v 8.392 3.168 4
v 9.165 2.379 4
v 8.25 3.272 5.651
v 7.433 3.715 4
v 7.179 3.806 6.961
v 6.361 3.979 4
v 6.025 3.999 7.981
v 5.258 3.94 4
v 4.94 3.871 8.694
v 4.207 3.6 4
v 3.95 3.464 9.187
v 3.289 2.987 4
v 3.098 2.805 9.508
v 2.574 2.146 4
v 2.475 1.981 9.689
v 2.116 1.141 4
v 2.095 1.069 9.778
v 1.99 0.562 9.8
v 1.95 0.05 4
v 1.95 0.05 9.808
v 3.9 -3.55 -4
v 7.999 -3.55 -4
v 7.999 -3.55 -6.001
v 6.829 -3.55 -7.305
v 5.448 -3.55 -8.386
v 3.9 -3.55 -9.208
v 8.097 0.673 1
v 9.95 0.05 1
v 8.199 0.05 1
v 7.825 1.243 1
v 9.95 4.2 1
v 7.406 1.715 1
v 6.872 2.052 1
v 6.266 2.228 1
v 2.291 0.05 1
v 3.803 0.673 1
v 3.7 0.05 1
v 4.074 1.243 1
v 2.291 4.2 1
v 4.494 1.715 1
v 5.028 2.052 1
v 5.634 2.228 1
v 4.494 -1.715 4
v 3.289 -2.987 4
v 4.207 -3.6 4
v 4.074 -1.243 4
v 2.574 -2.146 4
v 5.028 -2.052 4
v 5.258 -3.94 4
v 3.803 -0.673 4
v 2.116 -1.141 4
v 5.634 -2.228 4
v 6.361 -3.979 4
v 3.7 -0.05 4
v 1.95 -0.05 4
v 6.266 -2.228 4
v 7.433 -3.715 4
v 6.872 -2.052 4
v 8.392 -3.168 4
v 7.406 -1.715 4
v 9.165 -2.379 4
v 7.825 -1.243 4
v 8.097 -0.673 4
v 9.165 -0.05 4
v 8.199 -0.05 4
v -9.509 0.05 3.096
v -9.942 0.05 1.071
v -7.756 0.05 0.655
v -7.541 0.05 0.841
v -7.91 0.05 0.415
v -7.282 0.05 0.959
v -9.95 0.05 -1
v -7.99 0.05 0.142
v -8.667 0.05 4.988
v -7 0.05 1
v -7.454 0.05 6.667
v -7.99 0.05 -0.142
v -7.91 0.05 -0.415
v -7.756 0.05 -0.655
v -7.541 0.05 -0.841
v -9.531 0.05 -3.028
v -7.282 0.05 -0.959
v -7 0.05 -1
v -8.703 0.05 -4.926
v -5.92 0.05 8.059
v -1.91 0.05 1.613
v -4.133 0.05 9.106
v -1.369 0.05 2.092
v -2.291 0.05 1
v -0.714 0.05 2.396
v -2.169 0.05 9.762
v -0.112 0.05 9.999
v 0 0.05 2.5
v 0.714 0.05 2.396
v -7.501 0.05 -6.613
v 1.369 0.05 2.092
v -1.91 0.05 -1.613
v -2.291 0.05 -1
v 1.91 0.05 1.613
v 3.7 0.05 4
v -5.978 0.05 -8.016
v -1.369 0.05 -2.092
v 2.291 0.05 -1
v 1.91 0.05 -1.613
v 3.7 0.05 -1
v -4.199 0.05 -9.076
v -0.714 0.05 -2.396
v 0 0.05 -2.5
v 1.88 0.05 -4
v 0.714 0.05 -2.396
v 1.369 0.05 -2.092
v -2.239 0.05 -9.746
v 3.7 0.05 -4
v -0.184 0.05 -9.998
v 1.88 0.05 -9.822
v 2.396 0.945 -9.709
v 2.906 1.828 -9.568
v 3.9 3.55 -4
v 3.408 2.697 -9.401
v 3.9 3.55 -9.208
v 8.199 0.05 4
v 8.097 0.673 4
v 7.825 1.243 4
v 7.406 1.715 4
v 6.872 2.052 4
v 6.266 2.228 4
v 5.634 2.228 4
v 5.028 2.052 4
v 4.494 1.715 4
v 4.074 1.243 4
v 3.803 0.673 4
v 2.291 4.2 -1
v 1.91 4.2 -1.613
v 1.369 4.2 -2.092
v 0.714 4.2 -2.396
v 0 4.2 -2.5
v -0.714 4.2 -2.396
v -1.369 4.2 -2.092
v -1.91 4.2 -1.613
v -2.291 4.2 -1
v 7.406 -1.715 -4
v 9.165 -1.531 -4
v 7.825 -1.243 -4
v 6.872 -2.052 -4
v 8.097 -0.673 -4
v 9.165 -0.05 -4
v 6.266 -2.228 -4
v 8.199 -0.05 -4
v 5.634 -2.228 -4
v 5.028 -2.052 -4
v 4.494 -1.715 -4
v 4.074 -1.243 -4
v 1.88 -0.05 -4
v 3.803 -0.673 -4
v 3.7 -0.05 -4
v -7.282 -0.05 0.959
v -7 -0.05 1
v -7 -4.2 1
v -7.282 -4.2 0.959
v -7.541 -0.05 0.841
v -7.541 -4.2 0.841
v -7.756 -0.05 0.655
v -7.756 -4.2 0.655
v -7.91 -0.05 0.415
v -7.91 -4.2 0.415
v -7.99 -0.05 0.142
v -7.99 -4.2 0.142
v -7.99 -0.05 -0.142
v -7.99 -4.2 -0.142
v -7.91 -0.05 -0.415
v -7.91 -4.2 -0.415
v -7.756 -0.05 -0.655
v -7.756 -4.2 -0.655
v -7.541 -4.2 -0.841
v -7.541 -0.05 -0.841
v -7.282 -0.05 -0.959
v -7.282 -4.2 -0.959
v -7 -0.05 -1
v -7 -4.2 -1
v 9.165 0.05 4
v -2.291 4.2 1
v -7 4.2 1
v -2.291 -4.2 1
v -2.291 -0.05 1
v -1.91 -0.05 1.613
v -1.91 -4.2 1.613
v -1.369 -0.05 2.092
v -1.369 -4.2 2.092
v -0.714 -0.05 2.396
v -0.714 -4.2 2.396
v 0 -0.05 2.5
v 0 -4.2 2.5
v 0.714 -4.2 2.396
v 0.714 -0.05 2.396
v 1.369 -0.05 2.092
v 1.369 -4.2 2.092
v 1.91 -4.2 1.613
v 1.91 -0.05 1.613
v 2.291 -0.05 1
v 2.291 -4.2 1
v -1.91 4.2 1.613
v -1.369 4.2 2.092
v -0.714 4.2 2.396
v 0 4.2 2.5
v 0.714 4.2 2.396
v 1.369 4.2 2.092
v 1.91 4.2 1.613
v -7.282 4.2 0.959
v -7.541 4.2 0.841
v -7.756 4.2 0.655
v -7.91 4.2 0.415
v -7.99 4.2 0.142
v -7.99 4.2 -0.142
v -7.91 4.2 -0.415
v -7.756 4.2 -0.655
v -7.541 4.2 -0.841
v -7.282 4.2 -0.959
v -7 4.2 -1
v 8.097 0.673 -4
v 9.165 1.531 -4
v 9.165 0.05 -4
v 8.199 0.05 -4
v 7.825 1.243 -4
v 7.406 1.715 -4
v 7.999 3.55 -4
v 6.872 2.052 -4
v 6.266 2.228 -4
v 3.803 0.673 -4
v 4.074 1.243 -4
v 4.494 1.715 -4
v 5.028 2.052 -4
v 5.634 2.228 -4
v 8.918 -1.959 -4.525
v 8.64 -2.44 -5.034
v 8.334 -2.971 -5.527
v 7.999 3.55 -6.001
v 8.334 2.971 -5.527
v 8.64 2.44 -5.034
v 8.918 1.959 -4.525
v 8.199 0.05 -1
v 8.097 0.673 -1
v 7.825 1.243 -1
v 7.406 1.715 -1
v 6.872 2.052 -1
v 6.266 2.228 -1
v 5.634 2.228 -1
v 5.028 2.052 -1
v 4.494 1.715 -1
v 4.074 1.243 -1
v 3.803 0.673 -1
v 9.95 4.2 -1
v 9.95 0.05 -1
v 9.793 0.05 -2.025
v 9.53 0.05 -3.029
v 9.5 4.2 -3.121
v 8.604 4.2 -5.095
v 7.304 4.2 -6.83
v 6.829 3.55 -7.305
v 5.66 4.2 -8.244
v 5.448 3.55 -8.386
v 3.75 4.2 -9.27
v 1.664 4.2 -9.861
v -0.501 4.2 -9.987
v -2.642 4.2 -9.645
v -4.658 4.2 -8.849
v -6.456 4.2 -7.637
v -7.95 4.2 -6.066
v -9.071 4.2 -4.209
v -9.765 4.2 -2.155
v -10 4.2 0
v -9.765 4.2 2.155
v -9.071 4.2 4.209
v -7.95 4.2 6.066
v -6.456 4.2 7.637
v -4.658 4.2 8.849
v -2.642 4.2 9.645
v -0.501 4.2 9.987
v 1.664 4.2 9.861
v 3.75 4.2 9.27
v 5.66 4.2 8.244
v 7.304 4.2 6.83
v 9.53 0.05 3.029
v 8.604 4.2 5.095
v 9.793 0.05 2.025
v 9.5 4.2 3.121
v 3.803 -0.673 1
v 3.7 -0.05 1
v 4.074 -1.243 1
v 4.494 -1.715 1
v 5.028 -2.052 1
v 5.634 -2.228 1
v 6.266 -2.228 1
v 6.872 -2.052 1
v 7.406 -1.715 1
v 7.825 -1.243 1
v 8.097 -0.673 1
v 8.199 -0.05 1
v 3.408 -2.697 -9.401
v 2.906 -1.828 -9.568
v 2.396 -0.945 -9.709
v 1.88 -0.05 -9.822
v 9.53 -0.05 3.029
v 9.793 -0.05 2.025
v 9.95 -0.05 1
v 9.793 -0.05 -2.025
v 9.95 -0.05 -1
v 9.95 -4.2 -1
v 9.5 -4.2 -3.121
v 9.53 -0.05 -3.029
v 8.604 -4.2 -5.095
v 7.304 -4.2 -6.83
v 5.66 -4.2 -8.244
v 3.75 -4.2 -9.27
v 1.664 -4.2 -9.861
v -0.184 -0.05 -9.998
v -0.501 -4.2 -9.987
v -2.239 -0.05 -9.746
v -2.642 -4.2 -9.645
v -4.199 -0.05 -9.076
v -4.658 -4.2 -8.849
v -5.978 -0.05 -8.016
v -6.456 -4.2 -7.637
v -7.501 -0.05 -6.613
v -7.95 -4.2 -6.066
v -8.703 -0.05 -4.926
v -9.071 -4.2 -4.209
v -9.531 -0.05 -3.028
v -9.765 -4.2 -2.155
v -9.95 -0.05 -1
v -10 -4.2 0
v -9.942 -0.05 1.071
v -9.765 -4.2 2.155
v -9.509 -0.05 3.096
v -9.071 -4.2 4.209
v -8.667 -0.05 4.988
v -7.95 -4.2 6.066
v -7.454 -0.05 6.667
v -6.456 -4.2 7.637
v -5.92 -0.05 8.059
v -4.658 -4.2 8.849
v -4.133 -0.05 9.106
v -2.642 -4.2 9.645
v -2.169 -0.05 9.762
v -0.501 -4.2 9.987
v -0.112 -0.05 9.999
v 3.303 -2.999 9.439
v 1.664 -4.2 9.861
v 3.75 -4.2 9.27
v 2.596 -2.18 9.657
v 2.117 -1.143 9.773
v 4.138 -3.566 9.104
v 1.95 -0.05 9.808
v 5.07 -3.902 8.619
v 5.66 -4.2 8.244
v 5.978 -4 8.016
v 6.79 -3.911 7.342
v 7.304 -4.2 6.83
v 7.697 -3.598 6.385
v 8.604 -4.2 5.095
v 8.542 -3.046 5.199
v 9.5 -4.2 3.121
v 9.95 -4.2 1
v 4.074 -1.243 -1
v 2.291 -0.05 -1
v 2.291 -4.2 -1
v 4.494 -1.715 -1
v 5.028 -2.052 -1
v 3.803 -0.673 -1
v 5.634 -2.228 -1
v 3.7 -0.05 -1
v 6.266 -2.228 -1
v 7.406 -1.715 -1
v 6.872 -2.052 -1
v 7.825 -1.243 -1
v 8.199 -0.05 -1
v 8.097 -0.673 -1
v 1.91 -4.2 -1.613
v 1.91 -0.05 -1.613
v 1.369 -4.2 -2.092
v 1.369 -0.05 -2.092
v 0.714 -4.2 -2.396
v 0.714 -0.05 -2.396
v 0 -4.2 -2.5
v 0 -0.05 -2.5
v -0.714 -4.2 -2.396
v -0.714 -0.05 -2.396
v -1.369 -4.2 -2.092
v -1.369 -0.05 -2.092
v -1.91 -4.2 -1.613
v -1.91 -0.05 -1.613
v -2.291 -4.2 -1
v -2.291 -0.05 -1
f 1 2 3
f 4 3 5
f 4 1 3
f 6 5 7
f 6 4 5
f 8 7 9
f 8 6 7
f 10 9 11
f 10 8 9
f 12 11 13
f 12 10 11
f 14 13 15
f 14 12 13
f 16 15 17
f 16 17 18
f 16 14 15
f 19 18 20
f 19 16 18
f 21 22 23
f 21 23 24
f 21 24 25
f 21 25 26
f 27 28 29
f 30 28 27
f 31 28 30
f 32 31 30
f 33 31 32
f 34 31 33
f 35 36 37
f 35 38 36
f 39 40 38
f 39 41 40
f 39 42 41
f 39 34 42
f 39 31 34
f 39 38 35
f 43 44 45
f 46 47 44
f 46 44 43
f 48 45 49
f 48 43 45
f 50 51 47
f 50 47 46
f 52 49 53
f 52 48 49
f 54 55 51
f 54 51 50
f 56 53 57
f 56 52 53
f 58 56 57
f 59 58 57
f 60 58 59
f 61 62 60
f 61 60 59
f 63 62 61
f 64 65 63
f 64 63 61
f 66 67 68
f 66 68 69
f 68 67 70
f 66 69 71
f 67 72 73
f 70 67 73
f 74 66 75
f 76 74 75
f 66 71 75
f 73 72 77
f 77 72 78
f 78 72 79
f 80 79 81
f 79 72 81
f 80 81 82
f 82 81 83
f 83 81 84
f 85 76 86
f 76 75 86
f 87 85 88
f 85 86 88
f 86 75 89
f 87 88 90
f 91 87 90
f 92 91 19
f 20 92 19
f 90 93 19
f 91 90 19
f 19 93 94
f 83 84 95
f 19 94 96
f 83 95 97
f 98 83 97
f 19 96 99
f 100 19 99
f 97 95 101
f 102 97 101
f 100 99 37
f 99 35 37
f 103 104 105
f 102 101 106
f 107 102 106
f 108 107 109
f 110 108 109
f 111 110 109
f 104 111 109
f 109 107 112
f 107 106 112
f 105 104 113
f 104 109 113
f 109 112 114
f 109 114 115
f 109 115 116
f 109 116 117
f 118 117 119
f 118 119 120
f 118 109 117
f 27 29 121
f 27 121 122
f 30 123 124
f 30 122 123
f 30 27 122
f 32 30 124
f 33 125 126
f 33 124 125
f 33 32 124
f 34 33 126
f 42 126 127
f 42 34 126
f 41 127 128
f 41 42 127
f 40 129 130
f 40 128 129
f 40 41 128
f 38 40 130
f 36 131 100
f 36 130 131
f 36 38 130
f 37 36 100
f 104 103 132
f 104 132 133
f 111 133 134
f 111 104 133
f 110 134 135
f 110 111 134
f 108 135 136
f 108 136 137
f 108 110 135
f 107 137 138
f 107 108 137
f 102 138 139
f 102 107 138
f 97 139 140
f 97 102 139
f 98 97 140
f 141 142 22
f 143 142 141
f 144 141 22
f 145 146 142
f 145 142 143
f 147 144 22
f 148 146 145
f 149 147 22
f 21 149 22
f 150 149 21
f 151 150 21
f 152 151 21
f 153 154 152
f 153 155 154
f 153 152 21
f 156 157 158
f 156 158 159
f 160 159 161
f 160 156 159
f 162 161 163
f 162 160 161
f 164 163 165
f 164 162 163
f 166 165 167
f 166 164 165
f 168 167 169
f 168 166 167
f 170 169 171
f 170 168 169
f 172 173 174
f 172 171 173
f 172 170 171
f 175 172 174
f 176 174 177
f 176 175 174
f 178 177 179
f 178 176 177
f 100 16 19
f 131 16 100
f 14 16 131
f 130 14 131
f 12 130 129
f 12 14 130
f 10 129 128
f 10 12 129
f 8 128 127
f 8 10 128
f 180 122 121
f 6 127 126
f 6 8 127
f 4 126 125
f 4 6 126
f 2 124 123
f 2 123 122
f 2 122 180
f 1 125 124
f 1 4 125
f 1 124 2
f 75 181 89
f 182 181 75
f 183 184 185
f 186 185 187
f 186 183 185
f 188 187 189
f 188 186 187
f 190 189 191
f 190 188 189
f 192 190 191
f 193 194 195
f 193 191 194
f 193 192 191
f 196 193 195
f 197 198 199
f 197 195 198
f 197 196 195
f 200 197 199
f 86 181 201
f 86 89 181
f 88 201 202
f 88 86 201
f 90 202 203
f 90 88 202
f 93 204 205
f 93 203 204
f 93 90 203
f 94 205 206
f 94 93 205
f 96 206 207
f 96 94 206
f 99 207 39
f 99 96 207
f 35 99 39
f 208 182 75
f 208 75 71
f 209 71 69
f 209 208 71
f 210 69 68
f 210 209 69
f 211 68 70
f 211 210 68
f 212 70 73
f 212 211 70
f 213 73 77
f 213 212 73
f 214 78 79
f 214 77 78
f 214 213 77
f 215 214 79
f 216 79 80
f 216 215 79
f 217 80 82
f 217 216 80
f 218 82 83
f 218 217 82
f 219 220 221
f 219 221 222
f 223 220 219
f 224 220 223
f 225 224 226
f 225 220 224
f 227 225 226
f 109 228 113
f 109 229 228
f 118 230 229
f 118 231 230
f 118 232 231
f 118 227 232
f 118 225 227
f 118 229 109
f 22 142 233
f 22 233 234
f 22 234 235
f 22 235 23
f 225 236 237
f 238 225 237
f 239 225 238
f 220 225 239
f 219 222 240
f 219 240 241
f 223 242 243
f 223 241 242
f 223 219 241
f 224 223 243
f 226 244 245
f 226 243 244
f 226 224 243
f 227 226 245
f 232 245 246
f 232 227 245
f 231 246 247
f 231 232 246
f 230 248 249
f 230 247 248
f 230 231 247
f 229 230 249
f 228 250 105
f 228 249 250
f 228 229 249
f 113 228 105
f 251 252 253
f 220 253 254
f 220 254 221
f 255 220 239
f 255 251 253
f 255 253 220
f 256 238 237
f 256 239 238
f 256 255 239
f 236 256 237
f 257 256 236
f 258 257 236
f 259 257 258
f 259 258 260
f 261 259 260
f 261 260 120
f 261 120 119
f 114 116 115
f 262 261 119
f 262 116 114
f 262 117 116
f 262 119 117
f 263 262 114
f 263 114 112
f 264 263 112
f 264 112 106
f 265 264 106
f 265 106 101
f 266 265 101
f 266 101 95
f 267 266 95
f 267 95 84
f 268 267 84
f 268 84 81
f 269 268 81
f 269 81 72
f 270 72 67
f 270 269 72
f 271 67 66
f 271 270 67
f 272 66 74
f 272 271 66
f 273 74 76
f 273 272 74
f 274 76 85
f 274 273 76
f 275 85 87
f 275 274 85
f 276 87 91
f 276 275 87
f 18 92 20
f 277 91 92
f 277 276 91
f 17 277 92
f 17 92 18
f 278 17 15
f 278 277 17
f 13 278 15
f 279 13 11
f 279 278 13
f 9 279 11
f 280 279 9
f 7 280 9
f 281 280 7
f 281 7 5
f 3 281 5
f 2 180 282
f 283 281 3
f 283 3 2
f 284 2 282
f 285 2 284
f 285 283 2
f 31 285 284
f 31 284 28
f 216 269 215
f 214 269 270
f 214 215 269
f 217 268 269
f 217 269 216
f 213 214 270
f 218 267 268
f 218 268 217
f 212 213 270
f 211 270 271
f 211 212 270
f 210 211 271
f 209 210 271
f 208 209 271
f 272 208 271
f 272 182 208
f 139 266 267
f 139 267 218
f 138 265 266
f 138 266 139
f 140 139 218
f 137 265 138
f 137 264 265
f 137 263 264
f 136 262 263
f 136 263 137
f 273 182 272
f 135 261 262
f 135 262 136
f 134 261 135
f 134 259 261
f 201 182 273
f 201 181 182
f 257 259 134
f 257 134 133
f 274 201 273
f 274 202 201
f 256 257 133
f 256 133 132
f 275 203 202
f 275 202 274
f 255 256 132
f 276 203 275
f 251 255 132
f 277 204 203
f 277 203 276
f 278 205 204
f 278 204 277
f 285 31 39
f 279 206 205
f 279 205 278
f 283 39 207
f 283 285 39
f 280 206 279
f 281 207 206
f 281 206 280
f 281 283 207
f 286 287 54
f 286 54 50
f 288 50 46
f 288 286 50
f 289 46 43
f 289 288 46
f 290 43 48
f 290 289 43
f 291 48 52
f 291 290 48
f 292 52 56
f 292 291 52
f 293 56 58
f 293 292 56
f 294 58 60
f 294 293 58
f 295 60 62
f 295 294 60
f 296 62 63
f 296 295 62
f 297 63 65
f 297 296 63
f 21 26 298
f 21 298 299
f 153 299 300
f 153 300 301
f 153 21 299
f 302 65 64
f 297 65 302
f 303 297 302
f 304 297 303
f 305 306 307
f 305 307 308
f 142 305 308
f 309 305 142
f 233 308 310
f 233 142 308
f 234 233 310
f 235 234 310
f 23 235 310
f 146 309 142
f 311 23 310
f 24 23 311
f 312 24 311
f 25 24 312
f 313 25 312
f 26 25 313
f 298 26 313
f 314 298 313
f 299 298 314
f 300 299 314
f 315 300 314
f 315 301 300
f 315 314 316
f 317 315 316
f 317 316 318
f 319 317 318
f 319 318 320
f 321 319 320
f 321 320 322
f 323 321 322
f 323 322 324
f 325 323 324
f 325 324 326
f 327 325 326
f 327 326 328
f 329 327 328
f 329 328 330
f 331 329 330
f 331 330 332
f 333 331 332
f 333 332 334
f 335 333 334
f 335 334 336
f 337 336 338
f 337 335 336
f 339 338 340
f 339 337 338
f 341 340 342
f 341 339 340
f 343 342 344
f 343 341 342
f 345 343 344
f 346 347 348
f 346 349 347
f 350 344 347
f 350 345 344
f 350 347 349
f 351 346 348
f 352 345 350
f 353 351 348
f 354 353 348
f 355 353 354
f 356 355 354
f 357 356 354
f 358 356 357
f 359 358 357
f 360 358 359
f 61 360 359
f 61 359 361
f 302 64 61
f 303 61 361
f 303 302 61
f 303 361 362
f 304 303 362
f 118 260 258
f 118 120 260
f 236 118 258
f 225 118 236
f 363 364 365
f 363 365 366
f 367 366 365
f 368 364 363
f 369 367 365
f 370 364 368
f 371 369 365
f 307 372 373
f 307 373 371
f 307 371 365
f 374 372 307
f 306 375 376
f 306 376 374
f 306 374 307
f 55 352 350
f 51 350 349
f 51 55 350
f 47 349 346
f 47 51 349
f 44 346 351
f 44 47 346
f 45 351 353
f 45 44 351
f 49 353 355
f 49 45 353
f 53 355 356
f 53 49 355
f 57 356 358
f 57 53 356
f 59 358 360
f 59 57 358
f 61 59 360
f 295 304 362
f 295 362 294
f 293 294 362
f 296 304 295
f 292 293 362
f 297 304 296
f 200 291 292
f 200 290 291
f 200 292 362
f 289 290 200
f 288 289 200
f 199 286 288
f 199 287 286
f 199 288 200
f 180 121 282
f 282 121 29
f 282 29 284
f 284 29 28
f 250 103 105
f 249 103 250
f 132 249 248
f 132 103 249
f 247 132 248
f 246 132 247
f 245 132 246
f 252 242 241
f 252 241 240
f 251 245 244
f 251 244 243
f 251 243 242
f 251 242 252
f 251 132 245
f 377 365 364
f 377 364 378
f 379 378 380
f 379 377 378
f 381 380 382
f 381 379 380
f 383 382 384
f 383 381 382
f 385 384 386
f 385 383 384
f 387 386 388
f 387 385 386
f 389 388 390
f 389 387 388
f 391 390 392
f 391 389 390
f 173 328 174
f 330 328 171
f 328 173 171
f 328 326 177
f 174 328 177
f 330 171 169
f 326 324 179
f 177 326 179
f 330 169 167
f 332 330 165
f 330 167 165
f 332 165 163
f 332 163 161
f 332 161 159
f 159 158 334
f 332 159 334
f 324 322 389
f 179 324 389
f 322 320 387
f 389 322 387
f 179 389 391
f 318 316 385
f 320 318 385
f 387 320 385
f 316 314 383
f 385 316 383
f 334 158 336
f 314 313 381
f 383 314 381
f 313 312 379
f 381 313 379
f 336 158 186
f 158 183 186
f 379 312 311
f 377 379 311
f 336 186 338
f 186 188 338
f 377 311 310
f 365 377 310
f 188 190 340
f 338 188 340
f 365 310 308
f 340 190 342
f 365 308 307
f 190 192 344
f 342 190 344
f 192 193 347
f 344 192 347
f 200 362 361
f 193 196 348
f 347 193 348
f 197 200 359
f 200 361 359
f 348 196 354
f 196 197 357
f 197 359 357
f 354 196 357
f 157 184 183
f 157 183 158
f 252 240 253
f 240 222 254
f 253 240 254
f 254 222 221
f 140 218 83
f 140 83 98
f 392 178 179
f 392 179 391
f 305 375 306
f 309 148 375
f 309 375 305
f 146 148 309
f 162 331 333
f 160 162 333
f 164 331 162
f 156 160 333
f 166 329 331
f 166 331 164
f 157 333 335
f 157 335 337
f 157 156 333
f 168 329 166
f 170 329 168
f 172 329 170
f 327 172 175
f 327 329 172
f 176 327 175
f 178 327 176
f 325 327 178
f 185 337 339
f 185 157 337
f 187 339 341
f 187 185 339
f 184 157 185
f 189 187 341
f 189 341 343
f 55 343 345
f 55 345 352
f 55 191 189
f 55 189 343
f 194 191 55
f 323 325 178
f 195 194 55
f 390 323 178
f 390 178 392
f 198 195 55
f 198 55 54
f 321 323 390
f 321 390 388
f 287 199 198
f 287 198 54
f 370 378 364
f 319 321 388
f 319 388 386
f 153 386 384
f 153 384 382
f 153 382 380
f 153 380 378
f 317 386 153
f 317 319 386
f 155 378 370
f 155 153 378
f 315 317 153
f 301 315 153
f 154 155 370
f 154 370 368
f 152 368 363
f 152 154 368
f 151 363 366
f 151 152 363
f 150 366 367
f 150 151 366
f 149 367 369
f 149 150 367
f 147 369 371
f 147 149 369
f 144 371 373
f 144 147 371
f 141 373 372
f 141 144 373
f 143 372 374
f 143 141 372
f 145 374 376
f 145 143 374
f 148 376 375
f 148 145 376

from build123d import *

# Parameters (mm, degrees)
SKETCH1_R               = 10
SKETCH1_R_2             = 2.5
BOSS_EXTRUDE1_DEPTH     = 4.2
CUT_EXTRUDE1_DEPTH      = 17.448708156
CUT_EXTRUDE2_DEPTH      = 16.447977214
CUT_EXTRUDE2_DEPTH_BACK = 10
SKETCH3_R               = 2.25
CUT_EXTRUDE3_START      = 5
CUT_EXTRUDE3_DEPTH      = 10
CUT_EXTRUDE4_START      = 5
SKETCH6_R               = 4
CUT_EXTRUDE4_DEPTH      = 10
SKETCH9_R               = 10
CUT_EXTRUDE5_DEPTH      = 0.05


with BuildPart() as part:
    # Sketch1 → Boss-Extrude1 (new, symmetric)
    with BuildSketch(Plane(origin=(0, 0, 0), x_dir=(1, 0, 0), z_dir=(0, 1, 0))):
        Circle(SKETCH1_R)
        Circle(SKETCH1_R_2, mode=Mode.SUBTRACT)
    extrude(amount=BOSS_EXTRUDE1_DEPTH, both=True)

    # Sketch2 → Cut-Extrude1 (cut, through all)
    with BuildSketch(Plane(origin=(0, 4.2, 0), x_dir=(1, 0, 0), z_dir=(0, 1, 0))):
        with BuildLine():
            Line((-7, 1), (9.949874371, 1))
            ThreePointArc((9.949874371, 1), (10.949874371, 0), (9.949874371, -1))
            Line((9.949874371, -1), (-7, -1))
            ThreePointArc((-7, -1), (-8, 0), (-7, 1))
        make_face()
    extrude(amount=-CUT_EXTRUDE1_DEPTH, mode=Mode.SUBTRACT)

    # Sketch3 → Cut-Extrude2 (cut, two sides: drawn at the far end of the back side and taken through both)
    with BuildSketch(Plane.XY.offset(-1).offset(-CUT_EXTRUDE2_DEPTH_BACK)):
        with Locations((5.949874371, 0)):
            Circle(SKETCH3_R)
    extrude(amount=CUT_EXTRUDE2_DEPTH + CUT_EXTRUDE2_DEPTH_BACK, mode=Mode.SUBTRACT)

    # Sketch4 → Cut-Extrude3 (cut)
    with BuildSketch(Plane(origin=(0, 0, 1), x_dir=(-1, 0, 0), z_dir=(0, 0, -1)).offset(CUT_EXTRUDE3_START)):
        Polygon((-1.85068746, 0), (-3.900280915, 3.55), (-7.999467827, 3.55), (-10.049061282, 0), (-7.999467827, -3.55), (-3.900280915, -3.55), align=None)
    extrude(amount=CUT_EXTRUDE3_DEPTH, mode=Mode.SUBTRACT)

    # Sketch6 → Cut-Extrude4 (cut)
    with BuildSketch(Plane.XY.offset(-1).offset(CUT_EXTRUDE4_START)):
        with Locations((5.949874371, 0)):
            Circle(SKETCH6_R)
    extrude(amount=CUT_EXTRUDE4_DEPTH, mode=Mode.SUBTRACT)

    # Sketch9 → Cut-Extrude5 (cut, symmetric)
    with BuildSketch(Plane(origin=(0, 0, 0), x_dir=(1, 0, 0), z_dir=(0, 1, 0))):
        Circle(SKETCH9_R)
    extrude(amount=CUT_EXTRUDE5_DEPTH, both=True, mode=Mode.SUBTRACT)


with BuildPart() as cut_extrude5_piece_1:
    # of the separate pieces the step leaves, piece 1, a body of its own (cut_extrude5_pieces)
    add(part.part.solids().sort_by_distance((9.949874371, 4.2, -1))[0])


with BuildPart() as cut_extrude5_piece_2:
    # of the separate pieces the step leaves, piece 2, a body of its own (cut_extrude5_pieces)
    add(part.part.solids().sort_by_distance((9.949874371, -0.05, -1))[0])


solid = Compound([cut_extrude5_piece_1.part, cut_extrude5_piece_2.part])
